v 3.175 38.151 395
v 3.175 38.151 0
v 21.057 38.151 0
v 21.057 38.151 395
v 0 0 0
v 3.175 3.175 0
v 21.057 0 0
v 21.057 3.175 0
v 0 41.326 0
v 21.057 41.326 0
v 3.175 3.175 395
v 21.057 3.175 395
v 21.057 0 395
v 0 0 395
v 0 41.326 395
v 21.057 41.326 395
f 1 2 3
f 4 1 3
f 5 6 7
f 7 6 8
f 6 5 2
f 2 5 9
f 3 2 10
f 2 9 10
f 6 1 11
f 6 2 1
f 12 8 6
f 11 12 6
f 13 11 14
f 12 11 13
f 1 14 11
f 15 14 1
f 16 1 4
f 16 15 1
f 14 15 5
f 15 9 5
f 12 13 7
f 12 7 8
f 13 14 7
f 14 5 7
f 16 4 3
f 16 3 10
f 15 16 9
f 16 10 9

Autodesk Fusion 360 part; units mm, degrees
sketch "Sketch1" plane through (0, 0, 0) normal (0, 0, 1) x (1, 0, 0)
  line L0 (0, 0) -> (21.0566, 0)
  line L1 (21.0566, 0) -> (21.0566, 41.3258)
  line L2 (21.0566, 41.3258) -> (0, 41.3258)
  line L3 (0, 41.3258) -> (0, 0)
  line L4 (0, 20.6629) -> (21.0566, 20.6629) construction
  line L5 (0, 38.1508) -> (21.0566, 38.1508)
  line L6 (21.0566, 38.1508) -> (21.0566, 3.175) construction
  line L7 (21.0566, 3.175) -> (0, 3.175)
  line L8 (0, 3.175) -> (0, 38.1508) construction
  line L9 (0, 38.1508) -> (21.0566, 3.175) construction
  line L10 (21.0566, 38.1508) -> (0, 3.175) construction
  line L11 (3.175, 38.1508) -> (3.175, 3.175)
  point P0 (10.5283, 20.6629)
  point P1 (0, 20.6629)
  dimension "d1" = 41.3258
  dimension "d2" = 21.0566
  dimension "d3" = 3.175
  dimension "d4" = 3.175
extrude "Extrude1" add sketch "Sketch1" along normal blind 395 contours L0 L1 L3 L7 | L3 L5 L7 L11 | L1 L2 L3 L5
sketch "Sketch2" plane through (0, 0, 395) normal (0, 0, 1) x (-1, 0, 0)
  line L0 (-21.0566, -38.1508) -> (-21.0566, -41.3258)
  line L1 (-21.0566, -41.3258) -> (0, -41.3258)
  line L2 (0, -41.3258) -> (0, 0)
  line L3 (0, 0) -> (-21.0566, 0)
  line L4 (-21.0566, 0) -> (-21.0566, -3.175)
  line L5 (-21.0566, -3.175) -> (-3.175, -3.175)
  line L6 (-3.175, -3.175) -> (-3.175, -38.1508)
  line L7 (-3.175, -38.1508) -> (-21.0566, -38.1508)
  point P0 (0, -20.6629)
